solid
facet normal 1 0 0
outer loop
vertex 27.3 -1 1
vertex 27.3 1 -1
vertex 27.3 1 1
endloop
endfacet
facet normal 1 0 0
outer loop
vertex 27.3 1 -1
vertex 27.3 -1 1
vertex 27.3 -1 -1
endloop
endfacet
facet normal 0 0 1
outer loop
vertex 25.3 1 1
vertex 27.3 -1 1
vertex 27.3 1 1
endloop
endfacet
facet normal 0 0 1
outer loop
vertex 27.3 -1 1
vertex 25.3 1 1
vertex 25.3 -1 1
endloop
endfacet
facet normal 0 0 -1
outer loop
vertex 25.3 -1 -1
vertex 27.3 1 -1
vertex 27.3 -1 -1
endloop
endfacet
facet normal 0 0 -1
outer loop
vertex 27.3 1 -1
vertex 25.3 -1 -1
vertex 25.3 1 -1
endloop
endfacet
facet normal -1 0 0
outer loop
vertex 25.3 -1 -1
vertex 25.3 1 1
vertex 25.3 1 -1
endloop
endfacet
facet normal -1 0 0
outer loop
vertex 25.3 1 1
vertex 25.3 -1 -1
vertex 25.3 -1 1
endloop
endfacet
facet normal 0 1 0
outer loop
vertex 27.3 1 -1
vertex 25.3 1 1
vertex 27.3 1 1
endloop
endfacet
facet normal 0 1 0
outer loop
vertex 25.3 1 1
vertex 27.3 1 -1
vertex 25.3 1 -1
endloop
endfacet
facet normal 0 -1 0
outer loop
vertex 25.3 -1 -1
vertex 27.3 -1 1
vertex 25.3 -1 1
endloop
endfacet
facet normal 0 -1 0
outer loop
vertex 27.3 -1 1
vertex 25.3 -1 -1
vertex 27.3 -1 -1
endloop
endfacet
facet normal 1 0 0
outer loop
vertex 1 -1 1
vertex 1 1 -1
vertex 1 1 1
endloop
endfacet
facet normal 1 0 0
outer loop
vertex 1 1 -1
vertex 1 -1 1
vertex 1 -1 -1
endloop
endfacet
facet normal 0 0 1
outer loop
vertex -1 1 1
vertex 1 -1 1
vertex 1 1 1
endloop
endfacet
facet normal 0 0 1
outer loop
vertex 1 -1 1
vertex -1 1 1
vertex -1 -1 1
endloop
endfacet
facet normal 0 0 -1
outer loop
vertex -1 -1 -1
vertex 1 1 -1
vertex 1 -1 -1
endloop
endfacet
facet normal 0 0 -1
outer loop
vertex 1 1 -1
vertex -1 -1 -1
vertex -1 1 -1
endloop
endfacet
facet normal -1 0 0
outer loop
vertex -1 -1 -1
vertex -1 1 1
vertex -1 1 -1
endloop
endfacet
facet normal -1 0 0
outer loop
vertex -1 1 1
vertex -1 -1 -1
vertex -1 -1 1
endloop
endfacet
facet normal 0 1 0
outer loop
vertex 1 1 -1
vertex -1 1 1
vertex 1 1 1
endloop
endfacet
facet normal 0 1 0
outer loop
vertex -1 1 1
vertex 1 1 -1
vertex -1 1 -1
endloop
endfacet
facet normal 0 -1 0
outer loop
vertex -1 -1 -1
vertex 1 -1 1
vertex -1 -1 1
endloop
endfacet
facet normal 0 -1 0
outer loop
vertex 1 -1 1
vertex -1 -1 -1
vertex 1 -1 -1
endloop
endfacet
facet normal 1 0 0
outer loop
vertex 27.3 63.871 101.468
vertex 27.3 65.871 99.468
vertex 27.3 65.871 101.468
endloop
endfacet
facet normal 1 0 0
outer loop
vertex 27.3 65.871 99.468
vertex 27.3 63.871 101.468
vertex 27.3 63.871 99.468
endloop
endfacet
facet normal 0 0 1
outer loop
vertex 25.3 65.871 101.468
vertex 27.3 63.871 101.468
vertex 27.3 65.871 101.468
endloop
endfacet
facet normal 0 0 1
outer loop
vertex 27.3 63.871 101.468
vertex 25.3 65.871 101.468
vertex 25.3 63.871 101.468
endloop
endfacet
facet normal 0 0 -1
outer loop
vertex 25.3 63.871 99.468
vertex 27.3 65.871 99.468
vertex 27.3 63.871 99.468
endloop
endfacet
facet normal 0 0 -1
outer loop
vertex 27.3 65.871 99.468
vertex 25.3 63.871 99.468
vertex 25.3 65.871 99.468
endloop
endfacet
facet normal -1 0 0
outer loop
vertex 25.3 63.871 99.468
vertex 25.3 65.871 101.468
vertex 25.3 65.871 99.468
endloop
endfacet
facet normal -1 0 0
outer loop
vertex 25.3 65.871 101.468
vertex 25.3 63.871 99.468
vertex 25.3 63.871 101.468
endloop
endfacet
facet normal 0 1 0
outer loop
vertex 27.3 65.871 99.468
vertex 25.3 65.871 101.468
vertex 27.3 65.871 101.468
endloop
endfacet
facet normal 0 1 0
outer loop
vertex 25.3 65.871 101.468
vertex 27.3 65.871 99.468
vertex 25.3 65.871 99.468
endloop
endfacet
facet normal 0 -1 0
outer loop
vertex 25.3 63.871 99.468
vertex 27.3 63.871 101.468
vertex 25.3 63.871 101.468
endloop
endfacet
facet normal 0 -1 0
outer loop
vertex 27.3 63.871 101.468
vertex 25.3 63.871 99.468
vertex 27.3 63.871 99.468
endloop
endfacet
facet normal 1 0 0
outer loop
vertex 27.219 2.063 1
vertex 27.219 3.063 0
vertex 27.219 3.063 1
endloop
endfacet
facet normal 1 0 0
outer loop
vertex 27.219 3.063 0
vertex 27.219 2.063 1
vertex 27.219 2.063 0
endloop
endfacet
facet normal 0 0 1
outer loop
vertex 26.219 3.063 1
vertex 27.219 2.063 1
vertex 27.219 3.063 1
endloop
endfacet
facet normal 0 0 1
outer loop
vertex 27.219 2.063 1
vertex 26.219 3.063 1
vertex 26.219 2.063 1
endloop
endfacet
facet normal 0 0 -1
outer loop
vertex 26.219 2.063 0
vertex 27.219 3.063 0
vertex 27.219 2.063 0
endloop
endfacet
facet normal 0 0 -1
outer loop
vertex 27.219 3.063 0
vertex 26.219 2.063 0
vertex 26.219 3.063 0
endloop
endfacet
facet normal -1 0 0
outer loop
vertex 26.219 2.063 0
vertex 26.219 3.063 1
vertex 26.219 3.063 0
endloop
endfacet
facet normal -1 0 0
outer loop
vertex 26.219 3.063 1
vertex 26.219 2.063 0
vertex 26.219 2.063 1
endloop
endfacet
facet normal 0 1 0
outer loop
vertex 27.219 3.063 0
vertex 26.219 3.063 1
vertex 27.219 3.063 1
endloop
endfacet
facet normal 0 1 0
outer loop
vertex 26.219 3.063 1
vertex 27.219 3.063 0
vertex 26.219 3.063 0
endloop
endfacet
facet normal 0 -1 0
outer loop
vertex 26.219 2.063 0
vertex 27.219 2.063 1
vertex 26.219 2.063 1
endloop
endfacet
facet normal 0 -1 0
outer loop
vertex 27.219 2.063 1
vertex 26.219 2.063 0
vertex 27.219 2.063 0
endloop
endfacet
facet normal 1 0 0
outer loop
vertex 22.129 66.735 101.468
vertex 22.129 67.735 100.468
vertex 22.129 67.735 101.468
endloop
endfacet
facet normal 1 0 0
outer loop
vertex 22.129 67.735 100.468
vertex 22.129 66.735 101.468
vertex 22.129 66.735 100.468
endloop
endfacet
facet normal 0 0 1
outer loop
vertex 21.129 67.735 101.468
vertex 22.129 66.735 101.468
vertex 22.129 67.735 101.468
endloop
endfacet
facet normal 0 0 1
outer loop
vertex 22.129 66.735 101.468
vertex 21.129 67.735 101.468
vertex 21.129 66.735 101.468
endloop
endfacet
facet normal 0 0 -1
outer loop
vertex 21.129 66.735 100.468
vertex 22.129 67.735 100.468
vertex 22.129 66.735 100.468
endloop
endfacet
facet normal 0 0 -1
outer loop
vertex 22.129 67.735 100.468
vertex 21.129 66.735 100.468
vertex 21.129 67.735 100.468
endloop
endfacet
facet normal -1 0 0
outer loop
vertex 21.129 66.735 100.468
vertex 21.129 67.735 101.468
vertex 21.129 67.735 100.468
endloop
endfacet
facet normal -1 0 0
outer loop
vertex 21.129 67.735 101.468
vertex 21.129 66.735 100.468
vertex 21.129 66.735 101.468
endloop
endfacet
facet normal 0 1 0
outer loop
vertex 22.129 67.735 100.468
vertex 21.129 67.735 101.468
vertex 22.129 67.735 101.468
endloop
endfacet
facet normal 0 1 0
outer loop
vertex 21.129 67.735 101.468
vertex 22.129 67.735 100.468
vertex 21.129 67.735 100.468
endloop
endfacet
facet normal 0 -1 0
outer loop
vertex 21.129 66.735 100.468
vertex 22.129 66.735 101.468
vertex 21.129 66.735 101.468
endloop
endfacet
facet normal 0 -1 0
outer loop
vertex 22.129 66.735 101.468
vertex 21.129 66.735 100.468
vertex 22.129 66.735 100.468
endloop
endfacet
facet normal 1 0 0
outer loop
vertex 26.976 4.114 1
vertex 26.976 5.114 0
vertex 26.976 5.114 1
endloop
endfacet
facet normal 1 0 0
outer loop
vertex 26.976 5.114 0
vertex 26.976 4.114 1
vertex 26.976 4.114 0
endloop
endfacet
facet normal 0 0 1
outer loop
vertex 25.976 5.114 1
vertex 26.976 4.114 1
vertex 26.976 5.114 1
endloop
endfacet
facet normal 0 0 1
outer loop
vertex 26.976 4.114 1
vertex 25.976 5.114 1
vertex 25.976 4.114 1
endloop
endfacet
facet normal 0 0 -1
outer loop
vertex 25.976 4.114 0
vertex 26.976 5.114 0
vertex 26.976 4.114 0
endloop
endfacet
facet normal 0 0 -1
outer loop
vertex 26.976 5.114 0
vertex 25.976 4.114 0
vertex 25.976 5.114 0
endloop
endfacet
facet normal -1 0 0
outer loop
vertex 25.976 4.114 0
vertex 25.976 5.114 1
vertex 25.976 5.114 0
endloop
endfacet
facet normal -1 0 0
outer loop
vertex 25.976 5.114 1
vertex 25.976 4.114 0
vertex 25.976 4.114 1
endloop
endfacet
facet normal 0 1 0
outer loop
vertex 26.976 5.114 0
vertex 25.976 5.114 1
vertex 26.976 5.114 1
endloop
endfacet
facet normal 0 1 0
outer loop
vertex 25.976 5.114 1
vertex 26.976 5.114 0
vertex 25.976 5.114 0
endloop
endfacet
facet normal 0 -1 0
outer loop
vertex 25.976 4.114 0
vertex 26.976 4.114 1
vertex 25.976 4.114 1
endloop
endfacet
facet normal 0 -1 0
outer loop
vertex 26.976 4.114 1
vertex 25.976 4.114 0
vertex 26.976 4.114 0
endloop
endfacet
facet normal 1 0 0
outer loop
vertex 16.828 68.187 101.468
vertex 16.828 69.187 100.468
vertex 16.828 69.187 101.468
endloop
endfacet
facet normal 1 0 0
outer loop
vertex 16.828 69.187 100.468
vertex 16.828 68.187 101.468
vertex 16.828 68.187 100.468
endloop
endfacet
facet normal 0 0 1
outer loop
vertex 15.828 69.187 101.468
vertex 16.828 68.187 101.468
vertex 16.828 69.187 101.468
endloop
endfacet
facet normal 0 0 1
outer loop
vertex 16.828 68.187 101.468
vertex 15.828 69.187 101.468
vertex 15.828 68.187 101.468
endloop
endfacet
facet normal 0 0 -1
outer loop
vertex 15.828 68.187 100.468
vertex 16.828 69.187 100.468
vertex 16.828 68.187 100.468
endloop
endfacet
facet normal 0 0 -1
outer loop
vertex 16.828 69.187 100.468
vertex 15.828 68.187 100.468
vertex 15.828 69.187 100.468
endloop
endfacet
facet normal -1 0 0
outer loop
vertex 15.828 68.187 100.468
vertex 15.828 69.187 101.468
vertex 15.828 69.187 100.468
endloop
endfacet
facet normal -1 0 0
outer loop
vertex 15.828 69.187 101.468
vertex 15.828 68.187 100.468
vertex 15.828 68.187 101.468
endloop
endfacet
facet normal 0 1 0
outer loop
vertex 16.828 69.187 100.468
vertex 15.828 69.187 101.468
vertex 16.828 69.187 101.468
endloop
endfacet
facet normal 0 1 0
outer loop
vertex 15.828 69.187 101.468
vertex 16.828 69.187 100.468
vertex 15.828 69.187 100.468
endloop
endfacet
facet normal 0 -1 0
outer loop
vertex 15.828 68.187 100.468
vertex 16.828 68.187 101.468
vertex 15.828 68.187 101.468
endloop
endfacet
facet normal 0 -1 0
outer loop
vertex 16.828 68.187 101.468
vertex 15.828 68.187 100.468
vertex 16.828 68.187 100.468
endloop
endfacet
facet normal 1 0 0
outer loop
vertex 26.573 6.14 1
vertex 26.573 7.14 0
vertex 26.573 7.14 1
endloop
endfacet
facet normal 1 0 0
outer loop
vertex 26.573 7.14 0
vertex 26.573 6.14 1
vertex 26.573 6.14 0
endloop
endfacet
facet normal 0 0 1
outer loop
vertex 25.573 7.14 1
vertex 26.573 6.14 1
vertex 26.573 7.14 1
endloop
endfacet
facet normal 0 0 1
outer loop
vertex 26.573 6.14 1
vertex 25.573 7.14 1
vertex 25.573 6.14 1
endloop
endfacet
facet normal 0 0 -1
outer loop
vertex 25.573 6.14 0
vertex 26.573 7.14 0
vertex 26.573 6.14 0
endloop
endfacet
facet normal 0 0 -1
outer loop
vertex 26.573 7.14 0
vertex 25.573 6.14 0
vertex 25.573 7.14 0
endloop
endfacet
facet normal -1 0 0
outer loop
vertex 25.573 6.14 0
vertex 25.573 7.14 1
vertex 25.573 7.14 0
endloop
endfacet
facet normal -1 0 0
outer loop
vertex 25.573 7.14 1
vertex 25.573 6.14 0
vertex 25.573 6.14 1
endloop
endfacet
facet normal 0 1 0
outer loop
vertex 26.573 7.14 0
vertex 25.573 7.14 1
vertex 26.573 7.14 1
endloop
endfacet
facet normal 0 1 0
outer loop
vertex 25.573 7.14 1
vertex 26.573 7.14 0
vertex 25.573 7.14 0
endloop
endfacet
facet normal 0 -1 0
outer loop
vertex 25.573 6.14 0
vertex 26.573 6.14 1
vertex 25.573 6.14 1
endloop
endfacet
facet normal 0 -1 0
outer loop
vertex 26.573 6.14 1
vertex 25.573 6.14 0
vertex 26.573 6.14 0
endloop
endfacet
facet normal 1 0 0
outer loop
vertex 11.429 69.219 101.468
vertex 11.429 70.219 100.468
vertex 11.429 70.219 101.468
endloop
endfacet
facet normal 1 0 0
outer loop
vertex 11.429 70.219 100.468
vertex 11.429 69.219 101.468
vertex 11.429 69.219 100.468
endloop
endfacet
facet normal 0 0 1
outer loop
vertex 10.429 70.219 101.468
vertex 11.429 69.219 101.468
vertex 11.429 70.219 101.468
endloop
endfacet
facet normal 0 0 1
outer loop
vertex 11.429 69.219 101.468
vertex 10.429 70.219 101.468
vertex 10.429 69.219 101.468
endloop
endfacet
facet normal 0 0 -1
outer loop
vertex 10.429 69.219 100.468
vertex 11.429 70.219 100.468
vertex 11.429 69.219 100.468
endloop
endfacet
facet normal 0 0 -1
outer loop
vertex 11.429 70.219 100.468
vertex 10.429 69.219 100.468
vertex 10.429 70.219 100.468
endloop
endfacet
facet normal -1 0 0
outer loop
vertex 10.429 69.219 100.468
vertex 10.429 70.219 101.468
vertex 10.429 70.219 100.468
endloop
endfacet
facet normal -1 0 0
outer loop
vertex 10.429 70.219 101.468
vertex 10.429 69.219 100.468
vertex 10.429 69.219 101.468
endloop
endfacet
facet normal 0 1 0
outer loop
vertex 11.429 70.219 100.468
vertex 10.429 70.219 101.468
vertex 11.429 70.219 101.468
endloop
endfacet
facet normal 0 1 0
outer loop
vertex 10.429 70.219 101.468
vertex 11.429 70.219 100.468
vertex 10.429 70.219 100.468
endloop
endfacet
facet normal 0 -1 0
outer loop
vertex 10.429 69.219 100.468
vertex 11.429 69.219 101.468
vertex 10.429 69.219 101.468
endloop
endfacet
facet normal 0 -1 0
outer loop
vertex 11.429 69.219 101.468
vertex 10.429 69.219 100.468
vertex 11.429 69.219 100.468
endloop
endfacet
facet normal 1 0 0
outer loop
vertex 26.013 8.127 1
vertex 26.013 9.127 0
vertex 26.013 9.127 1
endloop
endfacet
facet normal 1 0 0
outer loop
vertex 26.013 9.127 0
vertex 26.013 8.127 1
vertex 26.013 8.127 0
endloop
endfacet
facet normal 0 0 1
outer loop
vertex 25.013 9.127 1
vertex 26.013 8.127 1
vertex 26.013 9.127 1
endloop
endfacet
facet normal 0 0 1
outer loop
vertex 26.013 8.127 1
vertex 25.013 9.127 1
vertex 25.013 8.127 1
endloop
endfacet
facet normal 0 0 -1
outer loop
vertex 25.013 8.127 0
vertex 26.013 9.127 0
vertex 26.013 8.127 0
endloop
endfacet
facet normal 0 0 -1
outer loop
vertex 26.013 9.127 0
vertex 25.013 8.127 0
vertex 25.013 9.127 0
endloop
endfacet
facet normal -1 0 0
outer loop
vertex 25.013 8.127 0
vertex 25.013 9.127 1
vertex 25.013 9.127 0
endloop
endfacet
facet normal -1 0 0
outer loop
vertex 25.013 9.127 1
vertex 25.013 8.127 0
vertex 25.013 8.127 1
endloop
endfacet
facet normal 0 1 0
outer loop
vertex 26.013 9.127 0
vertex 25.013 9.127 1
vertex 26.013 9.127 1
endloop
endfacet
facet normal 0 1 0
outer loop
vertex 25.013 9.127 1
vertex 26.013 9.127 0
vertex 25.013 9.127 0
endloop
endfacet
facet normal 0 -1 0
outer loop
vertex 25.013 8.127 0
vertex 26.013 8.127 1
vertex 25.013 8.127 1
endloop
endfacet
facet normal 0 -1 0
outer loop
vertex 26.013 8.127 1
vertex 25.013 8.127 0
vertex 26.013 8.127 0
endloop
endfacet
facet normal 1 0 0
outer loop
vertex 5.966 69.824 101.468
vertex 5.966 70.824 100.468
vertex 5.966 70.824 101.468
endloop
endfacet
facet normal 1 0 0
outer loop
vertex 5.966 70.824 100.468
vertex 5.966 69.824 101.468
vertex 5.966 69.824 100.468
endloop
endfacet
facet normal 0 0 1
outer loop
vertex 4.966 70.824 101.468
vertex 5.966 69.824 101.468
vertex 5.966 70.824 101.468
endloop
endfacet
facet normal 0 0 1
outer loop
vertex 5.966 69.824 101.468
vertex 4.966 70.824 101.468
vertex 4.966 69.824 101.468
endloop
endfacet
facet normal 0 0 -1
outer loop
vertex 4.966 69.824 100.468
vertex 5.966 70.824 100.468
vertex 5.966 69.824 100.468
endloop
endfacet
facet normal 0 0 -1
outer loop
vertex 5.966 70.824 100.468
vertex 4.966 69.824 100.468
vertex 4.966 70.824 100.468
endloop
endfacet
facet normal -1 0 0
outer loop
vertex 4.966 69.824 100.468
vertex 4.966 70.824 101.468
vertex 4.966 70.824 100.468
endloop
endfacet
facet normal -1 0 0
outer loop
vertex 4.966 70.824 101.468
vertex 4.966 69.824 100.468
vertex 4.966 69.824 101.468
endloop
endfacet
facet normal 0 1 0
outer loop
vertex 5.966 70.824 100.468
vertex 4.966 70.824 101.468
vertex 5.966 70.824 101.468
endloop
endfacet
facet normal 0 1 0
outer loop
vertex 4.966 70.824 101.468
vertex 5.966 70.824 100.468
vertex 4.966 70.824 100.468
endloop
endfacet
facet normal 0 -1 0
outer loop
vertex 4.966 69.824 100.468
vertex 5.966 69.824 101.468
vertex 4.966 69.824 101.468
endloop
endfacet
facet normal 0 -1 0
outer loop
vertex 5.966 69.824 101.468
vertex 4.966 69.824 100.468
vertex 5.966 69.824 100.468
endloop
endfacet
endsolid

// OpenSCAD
/*

* should 

*/

fancycap = false;
//todo: bonus X000 micron (X mm) filter for big chunks

$fa = .01;
$fs = 5;

//measurements
cone_folded_arc_angle = 105;
cone_slant_h = 120;
filter_slant_h = 43;

//design parameters
thin_wall_thickness = 2;
flow_gap = 3;
spout_id = 10;
cap_od = 52.6;

//shorthand
twt=thin_wall_thickness;

//calculated
cone_arc_angle = 2 * cone_folded_arc_angle;
cone_arc_length = 2 * PI * cone_arc_angle / 360 * cone_slant_h;
cone_r = (1/(2*PI)) * cone_arc_length;
cone_h = sqrt(cone_slant_h^2 - cone_r^2);
//cone_slope = cone_h/cone_r;

filter_h = filter_slant_h * (cone_h / cone_slant_h);
filter_r = filter_h * (cone_r / cone_h);


//todon't: this is good enough
module cap(fancy=!$preview){
	//from https://www.printables.com/model/215011-soda-bottle-funnel-cap-for-siraya-tech-resin-1-kg/files
	// if substituting your own,
	// position it so that the imaginary lip of the bottle
  // is	on the xy plane and centered around the z axis
	x_min=-13.59;
	y_min=-7.58;
	z_min=-.175;
	d = 54.53;
	d_narrow = cap_od;
	if(fancy){
		rotate([90,0,0])
			translate([x_min-.5*d,y_min,z_min-.5*d])
				import("basic_cap.stl", convexity=20);
	} else {
		difference(){
			translate([0,0,-19]) cylinder(h=21,d=d_narrow);
			translate([0,0,-20+.1])cylinder(h=20,r=25.5);
		}
	}
	

}

module funnel(){
	difference(){
		union(){
			//flow gap
			cylinder(h=cone_h-filter_h+flow_gap,r=filter_r+twt);
			translate([0,0,flow_gap+cone_h-filter_h]) cylinder(h=filter_h,r1=filter_r+twt, r2= twt);
			//funnel
			cylinder(h=cone_h, r1=cone_r + twt, r2 = twt);
			//spout
			cylinder(h=flow_gap+cone_h+99, d=spout_id+2*twt);
		}
		union(){
			//flow gap
			cylinder(h=cone_h-filter_h+flow_gap+.1,r=filter_r);
			#translate([0,0,flow_gap+cone_h-filter_h]) cylinder(h=filter_h,r1=filter_r, r2 = 0);
			//funnel
			translate([0,0,-.1]) cylinder(h=cone_h, r1=cone_r, r2 = 0);
			//spout
			cylinder(h=flow_gap+cone_h+99+.1, d=spout_id);
			
			translate([twt,0,cone_h+flow_gap]) hull(){
				translate([ cone_r,-50,-cone_h]) cube(100);
				translate([-cone_r,-50, cone_h]) cube(100);
			}
			//translate([0,0,cone_h]) rotate([30,0,0]) translate([0,0,50]) cube(100, center=true);
		}
	}
}

module hyperboloid(h, r0=cap_od/2, slope=cone_h/cone_r){
	/*
		xx/aa+yy/bb-zz/cc=1, asymptotic to xx/aa+yy/bb-zz/cc=0
		
		r^2/a^2-z^2/c^2=1; asymptotic to r^2/a^2-z^2/c^2=0;
		 asymptotic to r^2/a^2=z^2/c^2; or z/r=+/- c/a
		 
		 parametrezation over z
		 rr/aa=1+zz/cc
		 rr=aa+aazz/cc
		 r=sqrt(aa+aazz/cc)
		 
		 r=sqrt(r0^2+slope^-2*z^2)
	*/
	n=max(3,ceil(h*sqrt(1+slope^-2)/$fs));
	points = [[0,0],for(i=[0:n]) [sqrt(r0^2+(1/slope*h*i/n)^2),h*i/n],[0,h]];
	rotate_extrude() polygon(points);
}

module hyperboloid2(h, r0=cap_od/2, r1){
	/*
	r1=sqrt(r0^2+unslope^2*h^2)
	r1^2=r0^2+unslope^2*h^2
	(r1^2-r0^2)/h^2=unslope^2
	*/
	unslope=sqrt(r1^2-r0^2)/h;
	n=max(3,ceil(h*sqrt(1+unslope^2)/$fs));
	points = [[0,0],for(i=[0:n]) [sqrt(r0^2+(unslope*h*i/n)^2),h*i/n],[0,h]];
	rotate_extrude() polygon(points);
}

module hyperboloid3(h, r0, r1, thickness, num_legs, percent=.25){
	assert(r1>=r0);
	
	// reparamaterized such that f(..., t=1) = [_,_,h]
	function rule_line_point (alpha,a,b,c,h) = [a*cos(alpha),b*sin(alpha),0] +
		(h/c)*[-a*sin(alpha),b*cos(alpha),c];
	function inset_xy (point, inset) = 
		point - concat(inset * point.xy, [0]) / norm(point.xy);
	//function reversed(list) = [for (i=[1:len(list)]) list[len(list)-i]];
	
	
	
	unslope=sqrt(r1^2-r0^2)/h;
	
	a = r0;
	b = r0;
	c = a/unslope;
	
	/*
	ok so I want the 
	*/
	r_count = ceil(2*PI*r1/$fs/num_legs*percent);
	alpha_range = 360/num_legs*percent;
	
	//SCREAMING TODO
	//constantly vary inset from 0 to 1 to get side saddle. urgh
	
	
	points = [ for(alpha=[0:r_count-1],h=[0,h]) 
		each [
			rule_line_point(alpha/(r_count-1)*alpha_range,a,b,c,h),
			inset_xy(rule_line_point(alpha/(r_count-1)*alpha_range,a,b,c,h), thickness)
		]
	];
	polyhedron(points,faces);
	echo(points);
	for(i = [0:3]) translate(points[i])
		color(["red","green","blue","yellow"][i]) cube(2,center=true);
	for(p=points) translate(p) cube(1);
	
	faces = [[0,1,3,2],len(points)*[1,1,1,1] - [1,2,4,3]];
	echo(faces);
	cube();
}

!hyperboloid3(cone_h+flow_gap,cap_od/2,cone_r,5,5);

module main(){
	translate([0,0,cone_h+flow_gap]) mirror([0,0,1]) funnel();
	difference(){
		cap();
		//todo hardcoded
		cylinder(r=25.5-5,h=5);
	}
	%hyperboloid2(cone_h+flow_gap,cap_od/2,cone_r);
	%hyperboloid3(cone_h+flow_gap,cap_od/2,cone_r,5,5);
}

main();




echo([1,2,3]-[1]);
